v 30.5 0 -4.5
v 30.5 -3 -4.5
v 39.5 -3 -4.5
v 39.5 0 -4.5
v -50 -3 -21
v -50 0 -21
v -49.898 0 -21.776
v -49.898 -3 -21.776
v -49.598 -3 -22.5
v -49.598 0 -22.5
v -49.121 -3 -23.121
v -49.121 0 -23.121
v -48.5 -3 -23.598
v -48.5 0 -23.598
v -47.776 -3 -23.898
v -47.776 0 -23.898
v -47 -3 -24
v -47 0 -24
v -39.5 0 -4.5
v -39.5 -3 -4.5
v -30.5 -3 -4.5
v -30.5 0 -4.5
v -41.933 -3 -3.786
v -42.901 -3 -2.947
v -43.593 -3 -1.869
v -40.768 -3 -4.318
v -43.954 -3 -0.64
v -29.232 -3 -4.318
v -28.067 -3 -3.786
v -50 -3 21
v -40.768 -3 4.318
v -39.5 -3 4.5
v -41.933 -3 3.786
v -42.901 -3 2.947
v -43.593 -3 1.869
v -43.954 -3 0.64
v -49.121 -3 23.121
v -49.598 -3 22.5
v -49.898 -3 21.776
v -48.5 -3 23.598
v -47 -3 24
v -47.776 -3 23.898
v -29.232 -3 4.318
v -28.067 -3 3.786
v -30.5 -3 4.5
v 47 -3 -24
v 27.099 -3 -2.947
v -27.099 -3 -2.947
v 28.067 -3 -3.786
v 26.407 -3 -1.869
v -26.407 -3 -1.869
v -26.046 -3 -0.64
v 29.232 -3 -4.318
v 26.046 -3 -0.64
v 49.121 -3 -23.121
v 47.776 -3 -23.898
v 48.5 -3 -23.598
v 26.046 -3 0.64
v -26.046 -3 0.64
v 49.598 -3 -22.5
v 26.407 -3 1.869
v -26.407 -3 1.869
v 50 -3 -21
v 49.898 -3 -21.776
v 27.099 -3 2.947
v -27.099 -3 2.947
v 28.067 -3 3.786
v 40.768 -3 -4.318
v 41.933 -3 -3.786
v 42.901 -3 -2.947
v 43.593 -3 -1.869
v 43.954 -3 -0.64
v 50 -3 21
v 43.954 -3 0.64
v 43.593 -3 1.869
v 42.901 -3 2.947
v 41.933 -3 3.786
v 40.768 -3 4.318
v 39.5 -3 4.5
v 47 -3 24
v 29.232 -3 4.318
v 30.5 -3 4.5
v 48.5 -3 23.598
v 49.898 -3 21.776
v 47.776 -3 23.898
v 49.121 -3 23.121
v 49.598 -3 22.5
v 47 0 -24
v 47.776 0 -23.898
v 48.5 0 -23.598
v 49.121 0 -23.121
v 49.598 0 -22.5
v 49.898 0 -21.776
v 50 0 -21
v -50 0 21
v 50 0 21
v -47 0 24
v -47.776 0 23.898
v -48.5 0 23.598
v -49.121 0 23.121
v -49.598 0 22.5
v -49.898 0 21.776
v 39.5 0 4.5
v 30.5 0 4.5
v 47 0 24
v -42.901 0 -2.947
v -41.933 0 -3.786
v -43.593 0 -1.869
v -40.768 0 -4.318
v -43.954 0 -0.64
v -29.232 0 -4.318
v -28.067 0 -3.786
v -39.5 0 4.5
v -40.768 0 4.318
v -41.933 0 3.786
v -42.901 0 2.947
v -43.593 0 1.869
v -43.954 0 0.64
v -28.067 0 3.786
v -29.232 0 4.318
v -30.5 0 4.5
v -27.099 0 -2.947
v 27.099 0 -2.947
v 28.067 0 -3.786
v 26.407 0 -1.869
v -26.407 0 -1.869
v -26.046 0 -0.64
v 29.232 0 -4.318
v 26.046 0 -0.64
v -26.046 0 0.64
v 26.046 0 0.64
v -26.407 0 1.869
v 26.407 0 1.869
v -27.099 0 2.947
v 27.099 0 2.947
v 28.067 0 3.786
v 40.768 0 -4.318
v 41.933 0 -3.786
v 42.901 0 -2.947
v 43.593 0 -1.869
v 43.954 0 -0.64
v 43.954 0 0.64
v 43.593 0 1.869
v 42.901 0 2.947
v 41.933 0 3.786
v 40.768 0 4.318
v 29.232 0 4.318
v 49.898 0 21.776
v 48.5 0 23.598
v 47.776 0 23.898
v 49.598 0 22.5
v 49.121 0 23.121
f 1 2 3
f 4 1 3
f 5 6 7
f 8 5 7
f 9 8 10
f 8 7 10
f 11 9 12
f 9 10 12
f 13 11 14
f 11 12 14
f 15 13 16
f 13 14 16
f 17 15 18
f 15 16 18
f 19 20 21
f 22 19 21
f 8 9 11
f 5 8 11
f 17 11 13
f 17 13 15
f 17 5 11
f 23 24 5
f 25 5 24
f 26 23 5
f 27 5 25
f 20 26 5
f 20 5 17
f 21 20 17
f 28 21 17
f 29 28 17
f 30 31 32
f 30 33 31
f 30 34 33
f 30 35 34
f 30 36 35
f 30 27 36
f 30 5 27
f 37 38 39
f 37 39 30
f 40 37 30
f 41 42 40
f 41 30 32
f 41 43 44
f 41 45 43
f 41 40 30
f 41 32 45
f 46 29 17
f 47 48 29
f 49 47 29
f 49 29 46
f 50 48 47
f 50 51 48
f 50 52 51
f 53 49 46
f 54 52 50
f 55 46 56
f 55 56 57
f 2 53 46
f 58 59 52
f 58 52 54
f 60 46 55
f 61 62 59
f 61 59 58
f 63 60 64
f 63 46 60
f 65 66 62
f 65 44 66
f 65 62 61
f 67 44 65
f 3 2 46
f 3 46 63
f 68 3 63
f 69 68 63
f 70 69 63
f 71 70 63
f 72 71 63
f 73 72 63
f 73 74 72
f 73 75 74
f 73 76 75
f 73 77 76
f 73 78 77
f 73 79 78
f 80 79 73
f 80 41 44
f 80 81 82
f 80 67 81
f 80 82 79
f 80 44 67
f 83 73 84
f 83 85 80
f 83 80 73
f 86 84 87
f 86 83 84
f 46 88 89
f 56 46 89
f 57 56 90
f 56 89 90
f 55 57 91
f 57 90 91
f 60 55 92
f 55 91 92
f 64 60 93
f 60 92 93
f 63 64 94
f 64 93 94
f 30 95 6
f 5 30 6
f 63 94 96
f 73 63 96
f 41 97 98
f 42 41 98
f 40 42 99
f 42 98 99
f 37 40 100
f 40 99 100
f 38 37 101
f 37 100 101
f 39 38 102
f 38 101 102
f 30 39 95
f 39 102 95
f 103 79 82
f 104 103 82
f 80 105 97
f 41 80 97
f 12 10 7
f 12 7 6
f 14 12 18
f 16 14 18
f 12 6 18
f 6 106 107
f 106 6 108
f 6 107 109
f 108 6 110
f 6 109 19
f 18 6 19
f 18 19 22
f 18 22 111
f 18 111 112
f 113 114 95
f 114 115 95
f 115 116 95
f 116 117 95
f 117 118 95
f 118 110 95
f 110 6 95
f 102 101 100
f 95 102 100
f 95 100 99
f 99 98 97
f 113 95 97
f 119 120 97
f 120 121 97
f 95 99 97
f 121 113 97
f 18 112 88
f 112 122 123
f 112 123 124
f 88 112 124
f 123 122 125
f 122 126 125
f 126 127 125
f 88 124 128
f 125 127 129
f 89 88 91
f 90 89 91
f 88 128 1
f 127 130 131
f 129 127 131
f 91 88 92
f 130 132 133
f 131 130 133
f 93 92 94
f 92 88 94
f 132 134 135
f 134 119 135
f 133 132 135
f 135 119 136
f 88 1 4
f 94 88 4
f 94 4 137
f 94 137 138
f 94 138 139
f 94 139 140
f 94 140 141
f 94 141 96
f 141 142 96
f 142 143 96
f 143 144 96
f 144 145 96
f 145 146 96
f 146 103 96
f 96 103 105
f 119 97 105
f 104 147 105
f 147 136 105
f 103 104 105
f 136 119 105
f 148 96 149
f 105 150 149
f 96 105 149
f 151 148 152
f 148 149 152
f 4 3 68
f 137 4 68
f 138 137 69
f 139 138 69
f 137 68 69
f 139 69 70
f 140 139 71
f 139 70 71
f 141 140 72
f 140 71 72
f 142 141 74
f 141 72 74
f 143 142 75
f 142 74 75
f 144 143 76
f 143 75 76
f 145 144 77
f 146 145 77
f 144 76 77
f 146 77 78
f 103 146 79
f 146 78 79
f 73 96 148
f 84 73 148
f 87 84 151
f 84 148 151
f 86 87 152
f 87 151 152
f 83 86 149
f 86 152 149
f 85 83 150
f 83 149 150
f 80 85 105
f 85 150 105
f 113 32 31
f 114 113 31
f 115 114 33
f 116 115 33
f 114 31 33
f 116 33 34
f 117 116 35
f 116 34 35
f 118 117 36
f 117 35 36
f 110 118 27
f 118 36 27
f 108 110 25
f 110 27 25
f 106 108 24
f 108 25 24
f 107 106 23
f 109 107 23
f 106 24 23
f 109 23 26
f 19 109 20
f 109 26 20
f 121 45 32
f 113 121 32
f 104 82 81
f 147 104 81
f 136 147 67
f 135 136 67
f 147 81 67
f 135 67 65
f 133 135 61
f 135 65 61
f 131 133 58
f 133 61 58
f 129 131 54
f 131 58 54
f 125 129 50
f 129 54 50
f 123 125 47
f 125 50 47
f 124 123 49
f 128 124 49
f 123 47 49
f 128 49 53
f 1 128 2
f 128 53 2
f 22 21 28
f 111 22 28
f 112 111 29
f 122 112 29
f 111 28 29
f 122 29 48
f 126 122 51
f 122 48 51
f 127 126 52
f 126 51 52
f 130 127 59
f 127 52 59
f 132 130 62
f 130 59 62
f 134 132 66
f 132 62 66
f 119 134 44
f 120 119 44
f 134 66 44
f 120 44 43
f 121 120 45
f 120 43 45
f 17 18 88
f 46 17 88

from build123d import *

# Parameters (mm, degrees)
F1_DEPTH = 3
F3_DEPTH = 25


with BuildPart() as f1:
    # F0 (on Front) → F1 (new body)
    with BuildSketch(Plane.XZ):
        with BuildLine():
            ThreePointArc((50, 21), (49.12132, 23.12132), (47, 24))
            Line((47, 24), (-47, 24))
            ThreePointArc((-47, 24), (-49.12132, 23.12132), (-50, 21))
            Line((-50, 21), (-50, -21))
            ThreePointArc((-50, -21), (-49.12132, -23.12132), (-47, -24))
            Line((-47, -24), (47, -24))
            ThreePointArc((47, -24), (49.12132, -23.12132), (50, -21))
            Line((50, -21), (50, 21))
        make_face()
    extrude(amount=F1_DEPTH)

    # F2 (on face) → F3 (cut)
    with BuildSketch(Plane.XZ.offset(3)):
        with BuildLine():
            Line((30.5, -4.5), (39.5, -4.5))
            ThreePointArc((39.5, -4.5), (44, 0), (39.5, 4.5))
            Line((39.5, 4.5), (30.5, 4.5))
            ThreePointArc((30.5, 4.5), (26, 0), (30.5, -4.5))
        make_face()
        with BuildLine():
            ThreePointArc((-30.5, -4.5), (-26, 0), (-30.5, 4.5))
            Line((-30.5, 4.5), (-39.5, 4.5))
            ThreePointArc((-39.5, 4.5), (-44, 0), (-39.5, -4.5))
            Line((-39.5, -4.5), (-30.5, -4.5))
        make_face()
    extrude(amount=-F3_DEPTH, mode=Mode.SUBTRACT)


solid = f1.part
